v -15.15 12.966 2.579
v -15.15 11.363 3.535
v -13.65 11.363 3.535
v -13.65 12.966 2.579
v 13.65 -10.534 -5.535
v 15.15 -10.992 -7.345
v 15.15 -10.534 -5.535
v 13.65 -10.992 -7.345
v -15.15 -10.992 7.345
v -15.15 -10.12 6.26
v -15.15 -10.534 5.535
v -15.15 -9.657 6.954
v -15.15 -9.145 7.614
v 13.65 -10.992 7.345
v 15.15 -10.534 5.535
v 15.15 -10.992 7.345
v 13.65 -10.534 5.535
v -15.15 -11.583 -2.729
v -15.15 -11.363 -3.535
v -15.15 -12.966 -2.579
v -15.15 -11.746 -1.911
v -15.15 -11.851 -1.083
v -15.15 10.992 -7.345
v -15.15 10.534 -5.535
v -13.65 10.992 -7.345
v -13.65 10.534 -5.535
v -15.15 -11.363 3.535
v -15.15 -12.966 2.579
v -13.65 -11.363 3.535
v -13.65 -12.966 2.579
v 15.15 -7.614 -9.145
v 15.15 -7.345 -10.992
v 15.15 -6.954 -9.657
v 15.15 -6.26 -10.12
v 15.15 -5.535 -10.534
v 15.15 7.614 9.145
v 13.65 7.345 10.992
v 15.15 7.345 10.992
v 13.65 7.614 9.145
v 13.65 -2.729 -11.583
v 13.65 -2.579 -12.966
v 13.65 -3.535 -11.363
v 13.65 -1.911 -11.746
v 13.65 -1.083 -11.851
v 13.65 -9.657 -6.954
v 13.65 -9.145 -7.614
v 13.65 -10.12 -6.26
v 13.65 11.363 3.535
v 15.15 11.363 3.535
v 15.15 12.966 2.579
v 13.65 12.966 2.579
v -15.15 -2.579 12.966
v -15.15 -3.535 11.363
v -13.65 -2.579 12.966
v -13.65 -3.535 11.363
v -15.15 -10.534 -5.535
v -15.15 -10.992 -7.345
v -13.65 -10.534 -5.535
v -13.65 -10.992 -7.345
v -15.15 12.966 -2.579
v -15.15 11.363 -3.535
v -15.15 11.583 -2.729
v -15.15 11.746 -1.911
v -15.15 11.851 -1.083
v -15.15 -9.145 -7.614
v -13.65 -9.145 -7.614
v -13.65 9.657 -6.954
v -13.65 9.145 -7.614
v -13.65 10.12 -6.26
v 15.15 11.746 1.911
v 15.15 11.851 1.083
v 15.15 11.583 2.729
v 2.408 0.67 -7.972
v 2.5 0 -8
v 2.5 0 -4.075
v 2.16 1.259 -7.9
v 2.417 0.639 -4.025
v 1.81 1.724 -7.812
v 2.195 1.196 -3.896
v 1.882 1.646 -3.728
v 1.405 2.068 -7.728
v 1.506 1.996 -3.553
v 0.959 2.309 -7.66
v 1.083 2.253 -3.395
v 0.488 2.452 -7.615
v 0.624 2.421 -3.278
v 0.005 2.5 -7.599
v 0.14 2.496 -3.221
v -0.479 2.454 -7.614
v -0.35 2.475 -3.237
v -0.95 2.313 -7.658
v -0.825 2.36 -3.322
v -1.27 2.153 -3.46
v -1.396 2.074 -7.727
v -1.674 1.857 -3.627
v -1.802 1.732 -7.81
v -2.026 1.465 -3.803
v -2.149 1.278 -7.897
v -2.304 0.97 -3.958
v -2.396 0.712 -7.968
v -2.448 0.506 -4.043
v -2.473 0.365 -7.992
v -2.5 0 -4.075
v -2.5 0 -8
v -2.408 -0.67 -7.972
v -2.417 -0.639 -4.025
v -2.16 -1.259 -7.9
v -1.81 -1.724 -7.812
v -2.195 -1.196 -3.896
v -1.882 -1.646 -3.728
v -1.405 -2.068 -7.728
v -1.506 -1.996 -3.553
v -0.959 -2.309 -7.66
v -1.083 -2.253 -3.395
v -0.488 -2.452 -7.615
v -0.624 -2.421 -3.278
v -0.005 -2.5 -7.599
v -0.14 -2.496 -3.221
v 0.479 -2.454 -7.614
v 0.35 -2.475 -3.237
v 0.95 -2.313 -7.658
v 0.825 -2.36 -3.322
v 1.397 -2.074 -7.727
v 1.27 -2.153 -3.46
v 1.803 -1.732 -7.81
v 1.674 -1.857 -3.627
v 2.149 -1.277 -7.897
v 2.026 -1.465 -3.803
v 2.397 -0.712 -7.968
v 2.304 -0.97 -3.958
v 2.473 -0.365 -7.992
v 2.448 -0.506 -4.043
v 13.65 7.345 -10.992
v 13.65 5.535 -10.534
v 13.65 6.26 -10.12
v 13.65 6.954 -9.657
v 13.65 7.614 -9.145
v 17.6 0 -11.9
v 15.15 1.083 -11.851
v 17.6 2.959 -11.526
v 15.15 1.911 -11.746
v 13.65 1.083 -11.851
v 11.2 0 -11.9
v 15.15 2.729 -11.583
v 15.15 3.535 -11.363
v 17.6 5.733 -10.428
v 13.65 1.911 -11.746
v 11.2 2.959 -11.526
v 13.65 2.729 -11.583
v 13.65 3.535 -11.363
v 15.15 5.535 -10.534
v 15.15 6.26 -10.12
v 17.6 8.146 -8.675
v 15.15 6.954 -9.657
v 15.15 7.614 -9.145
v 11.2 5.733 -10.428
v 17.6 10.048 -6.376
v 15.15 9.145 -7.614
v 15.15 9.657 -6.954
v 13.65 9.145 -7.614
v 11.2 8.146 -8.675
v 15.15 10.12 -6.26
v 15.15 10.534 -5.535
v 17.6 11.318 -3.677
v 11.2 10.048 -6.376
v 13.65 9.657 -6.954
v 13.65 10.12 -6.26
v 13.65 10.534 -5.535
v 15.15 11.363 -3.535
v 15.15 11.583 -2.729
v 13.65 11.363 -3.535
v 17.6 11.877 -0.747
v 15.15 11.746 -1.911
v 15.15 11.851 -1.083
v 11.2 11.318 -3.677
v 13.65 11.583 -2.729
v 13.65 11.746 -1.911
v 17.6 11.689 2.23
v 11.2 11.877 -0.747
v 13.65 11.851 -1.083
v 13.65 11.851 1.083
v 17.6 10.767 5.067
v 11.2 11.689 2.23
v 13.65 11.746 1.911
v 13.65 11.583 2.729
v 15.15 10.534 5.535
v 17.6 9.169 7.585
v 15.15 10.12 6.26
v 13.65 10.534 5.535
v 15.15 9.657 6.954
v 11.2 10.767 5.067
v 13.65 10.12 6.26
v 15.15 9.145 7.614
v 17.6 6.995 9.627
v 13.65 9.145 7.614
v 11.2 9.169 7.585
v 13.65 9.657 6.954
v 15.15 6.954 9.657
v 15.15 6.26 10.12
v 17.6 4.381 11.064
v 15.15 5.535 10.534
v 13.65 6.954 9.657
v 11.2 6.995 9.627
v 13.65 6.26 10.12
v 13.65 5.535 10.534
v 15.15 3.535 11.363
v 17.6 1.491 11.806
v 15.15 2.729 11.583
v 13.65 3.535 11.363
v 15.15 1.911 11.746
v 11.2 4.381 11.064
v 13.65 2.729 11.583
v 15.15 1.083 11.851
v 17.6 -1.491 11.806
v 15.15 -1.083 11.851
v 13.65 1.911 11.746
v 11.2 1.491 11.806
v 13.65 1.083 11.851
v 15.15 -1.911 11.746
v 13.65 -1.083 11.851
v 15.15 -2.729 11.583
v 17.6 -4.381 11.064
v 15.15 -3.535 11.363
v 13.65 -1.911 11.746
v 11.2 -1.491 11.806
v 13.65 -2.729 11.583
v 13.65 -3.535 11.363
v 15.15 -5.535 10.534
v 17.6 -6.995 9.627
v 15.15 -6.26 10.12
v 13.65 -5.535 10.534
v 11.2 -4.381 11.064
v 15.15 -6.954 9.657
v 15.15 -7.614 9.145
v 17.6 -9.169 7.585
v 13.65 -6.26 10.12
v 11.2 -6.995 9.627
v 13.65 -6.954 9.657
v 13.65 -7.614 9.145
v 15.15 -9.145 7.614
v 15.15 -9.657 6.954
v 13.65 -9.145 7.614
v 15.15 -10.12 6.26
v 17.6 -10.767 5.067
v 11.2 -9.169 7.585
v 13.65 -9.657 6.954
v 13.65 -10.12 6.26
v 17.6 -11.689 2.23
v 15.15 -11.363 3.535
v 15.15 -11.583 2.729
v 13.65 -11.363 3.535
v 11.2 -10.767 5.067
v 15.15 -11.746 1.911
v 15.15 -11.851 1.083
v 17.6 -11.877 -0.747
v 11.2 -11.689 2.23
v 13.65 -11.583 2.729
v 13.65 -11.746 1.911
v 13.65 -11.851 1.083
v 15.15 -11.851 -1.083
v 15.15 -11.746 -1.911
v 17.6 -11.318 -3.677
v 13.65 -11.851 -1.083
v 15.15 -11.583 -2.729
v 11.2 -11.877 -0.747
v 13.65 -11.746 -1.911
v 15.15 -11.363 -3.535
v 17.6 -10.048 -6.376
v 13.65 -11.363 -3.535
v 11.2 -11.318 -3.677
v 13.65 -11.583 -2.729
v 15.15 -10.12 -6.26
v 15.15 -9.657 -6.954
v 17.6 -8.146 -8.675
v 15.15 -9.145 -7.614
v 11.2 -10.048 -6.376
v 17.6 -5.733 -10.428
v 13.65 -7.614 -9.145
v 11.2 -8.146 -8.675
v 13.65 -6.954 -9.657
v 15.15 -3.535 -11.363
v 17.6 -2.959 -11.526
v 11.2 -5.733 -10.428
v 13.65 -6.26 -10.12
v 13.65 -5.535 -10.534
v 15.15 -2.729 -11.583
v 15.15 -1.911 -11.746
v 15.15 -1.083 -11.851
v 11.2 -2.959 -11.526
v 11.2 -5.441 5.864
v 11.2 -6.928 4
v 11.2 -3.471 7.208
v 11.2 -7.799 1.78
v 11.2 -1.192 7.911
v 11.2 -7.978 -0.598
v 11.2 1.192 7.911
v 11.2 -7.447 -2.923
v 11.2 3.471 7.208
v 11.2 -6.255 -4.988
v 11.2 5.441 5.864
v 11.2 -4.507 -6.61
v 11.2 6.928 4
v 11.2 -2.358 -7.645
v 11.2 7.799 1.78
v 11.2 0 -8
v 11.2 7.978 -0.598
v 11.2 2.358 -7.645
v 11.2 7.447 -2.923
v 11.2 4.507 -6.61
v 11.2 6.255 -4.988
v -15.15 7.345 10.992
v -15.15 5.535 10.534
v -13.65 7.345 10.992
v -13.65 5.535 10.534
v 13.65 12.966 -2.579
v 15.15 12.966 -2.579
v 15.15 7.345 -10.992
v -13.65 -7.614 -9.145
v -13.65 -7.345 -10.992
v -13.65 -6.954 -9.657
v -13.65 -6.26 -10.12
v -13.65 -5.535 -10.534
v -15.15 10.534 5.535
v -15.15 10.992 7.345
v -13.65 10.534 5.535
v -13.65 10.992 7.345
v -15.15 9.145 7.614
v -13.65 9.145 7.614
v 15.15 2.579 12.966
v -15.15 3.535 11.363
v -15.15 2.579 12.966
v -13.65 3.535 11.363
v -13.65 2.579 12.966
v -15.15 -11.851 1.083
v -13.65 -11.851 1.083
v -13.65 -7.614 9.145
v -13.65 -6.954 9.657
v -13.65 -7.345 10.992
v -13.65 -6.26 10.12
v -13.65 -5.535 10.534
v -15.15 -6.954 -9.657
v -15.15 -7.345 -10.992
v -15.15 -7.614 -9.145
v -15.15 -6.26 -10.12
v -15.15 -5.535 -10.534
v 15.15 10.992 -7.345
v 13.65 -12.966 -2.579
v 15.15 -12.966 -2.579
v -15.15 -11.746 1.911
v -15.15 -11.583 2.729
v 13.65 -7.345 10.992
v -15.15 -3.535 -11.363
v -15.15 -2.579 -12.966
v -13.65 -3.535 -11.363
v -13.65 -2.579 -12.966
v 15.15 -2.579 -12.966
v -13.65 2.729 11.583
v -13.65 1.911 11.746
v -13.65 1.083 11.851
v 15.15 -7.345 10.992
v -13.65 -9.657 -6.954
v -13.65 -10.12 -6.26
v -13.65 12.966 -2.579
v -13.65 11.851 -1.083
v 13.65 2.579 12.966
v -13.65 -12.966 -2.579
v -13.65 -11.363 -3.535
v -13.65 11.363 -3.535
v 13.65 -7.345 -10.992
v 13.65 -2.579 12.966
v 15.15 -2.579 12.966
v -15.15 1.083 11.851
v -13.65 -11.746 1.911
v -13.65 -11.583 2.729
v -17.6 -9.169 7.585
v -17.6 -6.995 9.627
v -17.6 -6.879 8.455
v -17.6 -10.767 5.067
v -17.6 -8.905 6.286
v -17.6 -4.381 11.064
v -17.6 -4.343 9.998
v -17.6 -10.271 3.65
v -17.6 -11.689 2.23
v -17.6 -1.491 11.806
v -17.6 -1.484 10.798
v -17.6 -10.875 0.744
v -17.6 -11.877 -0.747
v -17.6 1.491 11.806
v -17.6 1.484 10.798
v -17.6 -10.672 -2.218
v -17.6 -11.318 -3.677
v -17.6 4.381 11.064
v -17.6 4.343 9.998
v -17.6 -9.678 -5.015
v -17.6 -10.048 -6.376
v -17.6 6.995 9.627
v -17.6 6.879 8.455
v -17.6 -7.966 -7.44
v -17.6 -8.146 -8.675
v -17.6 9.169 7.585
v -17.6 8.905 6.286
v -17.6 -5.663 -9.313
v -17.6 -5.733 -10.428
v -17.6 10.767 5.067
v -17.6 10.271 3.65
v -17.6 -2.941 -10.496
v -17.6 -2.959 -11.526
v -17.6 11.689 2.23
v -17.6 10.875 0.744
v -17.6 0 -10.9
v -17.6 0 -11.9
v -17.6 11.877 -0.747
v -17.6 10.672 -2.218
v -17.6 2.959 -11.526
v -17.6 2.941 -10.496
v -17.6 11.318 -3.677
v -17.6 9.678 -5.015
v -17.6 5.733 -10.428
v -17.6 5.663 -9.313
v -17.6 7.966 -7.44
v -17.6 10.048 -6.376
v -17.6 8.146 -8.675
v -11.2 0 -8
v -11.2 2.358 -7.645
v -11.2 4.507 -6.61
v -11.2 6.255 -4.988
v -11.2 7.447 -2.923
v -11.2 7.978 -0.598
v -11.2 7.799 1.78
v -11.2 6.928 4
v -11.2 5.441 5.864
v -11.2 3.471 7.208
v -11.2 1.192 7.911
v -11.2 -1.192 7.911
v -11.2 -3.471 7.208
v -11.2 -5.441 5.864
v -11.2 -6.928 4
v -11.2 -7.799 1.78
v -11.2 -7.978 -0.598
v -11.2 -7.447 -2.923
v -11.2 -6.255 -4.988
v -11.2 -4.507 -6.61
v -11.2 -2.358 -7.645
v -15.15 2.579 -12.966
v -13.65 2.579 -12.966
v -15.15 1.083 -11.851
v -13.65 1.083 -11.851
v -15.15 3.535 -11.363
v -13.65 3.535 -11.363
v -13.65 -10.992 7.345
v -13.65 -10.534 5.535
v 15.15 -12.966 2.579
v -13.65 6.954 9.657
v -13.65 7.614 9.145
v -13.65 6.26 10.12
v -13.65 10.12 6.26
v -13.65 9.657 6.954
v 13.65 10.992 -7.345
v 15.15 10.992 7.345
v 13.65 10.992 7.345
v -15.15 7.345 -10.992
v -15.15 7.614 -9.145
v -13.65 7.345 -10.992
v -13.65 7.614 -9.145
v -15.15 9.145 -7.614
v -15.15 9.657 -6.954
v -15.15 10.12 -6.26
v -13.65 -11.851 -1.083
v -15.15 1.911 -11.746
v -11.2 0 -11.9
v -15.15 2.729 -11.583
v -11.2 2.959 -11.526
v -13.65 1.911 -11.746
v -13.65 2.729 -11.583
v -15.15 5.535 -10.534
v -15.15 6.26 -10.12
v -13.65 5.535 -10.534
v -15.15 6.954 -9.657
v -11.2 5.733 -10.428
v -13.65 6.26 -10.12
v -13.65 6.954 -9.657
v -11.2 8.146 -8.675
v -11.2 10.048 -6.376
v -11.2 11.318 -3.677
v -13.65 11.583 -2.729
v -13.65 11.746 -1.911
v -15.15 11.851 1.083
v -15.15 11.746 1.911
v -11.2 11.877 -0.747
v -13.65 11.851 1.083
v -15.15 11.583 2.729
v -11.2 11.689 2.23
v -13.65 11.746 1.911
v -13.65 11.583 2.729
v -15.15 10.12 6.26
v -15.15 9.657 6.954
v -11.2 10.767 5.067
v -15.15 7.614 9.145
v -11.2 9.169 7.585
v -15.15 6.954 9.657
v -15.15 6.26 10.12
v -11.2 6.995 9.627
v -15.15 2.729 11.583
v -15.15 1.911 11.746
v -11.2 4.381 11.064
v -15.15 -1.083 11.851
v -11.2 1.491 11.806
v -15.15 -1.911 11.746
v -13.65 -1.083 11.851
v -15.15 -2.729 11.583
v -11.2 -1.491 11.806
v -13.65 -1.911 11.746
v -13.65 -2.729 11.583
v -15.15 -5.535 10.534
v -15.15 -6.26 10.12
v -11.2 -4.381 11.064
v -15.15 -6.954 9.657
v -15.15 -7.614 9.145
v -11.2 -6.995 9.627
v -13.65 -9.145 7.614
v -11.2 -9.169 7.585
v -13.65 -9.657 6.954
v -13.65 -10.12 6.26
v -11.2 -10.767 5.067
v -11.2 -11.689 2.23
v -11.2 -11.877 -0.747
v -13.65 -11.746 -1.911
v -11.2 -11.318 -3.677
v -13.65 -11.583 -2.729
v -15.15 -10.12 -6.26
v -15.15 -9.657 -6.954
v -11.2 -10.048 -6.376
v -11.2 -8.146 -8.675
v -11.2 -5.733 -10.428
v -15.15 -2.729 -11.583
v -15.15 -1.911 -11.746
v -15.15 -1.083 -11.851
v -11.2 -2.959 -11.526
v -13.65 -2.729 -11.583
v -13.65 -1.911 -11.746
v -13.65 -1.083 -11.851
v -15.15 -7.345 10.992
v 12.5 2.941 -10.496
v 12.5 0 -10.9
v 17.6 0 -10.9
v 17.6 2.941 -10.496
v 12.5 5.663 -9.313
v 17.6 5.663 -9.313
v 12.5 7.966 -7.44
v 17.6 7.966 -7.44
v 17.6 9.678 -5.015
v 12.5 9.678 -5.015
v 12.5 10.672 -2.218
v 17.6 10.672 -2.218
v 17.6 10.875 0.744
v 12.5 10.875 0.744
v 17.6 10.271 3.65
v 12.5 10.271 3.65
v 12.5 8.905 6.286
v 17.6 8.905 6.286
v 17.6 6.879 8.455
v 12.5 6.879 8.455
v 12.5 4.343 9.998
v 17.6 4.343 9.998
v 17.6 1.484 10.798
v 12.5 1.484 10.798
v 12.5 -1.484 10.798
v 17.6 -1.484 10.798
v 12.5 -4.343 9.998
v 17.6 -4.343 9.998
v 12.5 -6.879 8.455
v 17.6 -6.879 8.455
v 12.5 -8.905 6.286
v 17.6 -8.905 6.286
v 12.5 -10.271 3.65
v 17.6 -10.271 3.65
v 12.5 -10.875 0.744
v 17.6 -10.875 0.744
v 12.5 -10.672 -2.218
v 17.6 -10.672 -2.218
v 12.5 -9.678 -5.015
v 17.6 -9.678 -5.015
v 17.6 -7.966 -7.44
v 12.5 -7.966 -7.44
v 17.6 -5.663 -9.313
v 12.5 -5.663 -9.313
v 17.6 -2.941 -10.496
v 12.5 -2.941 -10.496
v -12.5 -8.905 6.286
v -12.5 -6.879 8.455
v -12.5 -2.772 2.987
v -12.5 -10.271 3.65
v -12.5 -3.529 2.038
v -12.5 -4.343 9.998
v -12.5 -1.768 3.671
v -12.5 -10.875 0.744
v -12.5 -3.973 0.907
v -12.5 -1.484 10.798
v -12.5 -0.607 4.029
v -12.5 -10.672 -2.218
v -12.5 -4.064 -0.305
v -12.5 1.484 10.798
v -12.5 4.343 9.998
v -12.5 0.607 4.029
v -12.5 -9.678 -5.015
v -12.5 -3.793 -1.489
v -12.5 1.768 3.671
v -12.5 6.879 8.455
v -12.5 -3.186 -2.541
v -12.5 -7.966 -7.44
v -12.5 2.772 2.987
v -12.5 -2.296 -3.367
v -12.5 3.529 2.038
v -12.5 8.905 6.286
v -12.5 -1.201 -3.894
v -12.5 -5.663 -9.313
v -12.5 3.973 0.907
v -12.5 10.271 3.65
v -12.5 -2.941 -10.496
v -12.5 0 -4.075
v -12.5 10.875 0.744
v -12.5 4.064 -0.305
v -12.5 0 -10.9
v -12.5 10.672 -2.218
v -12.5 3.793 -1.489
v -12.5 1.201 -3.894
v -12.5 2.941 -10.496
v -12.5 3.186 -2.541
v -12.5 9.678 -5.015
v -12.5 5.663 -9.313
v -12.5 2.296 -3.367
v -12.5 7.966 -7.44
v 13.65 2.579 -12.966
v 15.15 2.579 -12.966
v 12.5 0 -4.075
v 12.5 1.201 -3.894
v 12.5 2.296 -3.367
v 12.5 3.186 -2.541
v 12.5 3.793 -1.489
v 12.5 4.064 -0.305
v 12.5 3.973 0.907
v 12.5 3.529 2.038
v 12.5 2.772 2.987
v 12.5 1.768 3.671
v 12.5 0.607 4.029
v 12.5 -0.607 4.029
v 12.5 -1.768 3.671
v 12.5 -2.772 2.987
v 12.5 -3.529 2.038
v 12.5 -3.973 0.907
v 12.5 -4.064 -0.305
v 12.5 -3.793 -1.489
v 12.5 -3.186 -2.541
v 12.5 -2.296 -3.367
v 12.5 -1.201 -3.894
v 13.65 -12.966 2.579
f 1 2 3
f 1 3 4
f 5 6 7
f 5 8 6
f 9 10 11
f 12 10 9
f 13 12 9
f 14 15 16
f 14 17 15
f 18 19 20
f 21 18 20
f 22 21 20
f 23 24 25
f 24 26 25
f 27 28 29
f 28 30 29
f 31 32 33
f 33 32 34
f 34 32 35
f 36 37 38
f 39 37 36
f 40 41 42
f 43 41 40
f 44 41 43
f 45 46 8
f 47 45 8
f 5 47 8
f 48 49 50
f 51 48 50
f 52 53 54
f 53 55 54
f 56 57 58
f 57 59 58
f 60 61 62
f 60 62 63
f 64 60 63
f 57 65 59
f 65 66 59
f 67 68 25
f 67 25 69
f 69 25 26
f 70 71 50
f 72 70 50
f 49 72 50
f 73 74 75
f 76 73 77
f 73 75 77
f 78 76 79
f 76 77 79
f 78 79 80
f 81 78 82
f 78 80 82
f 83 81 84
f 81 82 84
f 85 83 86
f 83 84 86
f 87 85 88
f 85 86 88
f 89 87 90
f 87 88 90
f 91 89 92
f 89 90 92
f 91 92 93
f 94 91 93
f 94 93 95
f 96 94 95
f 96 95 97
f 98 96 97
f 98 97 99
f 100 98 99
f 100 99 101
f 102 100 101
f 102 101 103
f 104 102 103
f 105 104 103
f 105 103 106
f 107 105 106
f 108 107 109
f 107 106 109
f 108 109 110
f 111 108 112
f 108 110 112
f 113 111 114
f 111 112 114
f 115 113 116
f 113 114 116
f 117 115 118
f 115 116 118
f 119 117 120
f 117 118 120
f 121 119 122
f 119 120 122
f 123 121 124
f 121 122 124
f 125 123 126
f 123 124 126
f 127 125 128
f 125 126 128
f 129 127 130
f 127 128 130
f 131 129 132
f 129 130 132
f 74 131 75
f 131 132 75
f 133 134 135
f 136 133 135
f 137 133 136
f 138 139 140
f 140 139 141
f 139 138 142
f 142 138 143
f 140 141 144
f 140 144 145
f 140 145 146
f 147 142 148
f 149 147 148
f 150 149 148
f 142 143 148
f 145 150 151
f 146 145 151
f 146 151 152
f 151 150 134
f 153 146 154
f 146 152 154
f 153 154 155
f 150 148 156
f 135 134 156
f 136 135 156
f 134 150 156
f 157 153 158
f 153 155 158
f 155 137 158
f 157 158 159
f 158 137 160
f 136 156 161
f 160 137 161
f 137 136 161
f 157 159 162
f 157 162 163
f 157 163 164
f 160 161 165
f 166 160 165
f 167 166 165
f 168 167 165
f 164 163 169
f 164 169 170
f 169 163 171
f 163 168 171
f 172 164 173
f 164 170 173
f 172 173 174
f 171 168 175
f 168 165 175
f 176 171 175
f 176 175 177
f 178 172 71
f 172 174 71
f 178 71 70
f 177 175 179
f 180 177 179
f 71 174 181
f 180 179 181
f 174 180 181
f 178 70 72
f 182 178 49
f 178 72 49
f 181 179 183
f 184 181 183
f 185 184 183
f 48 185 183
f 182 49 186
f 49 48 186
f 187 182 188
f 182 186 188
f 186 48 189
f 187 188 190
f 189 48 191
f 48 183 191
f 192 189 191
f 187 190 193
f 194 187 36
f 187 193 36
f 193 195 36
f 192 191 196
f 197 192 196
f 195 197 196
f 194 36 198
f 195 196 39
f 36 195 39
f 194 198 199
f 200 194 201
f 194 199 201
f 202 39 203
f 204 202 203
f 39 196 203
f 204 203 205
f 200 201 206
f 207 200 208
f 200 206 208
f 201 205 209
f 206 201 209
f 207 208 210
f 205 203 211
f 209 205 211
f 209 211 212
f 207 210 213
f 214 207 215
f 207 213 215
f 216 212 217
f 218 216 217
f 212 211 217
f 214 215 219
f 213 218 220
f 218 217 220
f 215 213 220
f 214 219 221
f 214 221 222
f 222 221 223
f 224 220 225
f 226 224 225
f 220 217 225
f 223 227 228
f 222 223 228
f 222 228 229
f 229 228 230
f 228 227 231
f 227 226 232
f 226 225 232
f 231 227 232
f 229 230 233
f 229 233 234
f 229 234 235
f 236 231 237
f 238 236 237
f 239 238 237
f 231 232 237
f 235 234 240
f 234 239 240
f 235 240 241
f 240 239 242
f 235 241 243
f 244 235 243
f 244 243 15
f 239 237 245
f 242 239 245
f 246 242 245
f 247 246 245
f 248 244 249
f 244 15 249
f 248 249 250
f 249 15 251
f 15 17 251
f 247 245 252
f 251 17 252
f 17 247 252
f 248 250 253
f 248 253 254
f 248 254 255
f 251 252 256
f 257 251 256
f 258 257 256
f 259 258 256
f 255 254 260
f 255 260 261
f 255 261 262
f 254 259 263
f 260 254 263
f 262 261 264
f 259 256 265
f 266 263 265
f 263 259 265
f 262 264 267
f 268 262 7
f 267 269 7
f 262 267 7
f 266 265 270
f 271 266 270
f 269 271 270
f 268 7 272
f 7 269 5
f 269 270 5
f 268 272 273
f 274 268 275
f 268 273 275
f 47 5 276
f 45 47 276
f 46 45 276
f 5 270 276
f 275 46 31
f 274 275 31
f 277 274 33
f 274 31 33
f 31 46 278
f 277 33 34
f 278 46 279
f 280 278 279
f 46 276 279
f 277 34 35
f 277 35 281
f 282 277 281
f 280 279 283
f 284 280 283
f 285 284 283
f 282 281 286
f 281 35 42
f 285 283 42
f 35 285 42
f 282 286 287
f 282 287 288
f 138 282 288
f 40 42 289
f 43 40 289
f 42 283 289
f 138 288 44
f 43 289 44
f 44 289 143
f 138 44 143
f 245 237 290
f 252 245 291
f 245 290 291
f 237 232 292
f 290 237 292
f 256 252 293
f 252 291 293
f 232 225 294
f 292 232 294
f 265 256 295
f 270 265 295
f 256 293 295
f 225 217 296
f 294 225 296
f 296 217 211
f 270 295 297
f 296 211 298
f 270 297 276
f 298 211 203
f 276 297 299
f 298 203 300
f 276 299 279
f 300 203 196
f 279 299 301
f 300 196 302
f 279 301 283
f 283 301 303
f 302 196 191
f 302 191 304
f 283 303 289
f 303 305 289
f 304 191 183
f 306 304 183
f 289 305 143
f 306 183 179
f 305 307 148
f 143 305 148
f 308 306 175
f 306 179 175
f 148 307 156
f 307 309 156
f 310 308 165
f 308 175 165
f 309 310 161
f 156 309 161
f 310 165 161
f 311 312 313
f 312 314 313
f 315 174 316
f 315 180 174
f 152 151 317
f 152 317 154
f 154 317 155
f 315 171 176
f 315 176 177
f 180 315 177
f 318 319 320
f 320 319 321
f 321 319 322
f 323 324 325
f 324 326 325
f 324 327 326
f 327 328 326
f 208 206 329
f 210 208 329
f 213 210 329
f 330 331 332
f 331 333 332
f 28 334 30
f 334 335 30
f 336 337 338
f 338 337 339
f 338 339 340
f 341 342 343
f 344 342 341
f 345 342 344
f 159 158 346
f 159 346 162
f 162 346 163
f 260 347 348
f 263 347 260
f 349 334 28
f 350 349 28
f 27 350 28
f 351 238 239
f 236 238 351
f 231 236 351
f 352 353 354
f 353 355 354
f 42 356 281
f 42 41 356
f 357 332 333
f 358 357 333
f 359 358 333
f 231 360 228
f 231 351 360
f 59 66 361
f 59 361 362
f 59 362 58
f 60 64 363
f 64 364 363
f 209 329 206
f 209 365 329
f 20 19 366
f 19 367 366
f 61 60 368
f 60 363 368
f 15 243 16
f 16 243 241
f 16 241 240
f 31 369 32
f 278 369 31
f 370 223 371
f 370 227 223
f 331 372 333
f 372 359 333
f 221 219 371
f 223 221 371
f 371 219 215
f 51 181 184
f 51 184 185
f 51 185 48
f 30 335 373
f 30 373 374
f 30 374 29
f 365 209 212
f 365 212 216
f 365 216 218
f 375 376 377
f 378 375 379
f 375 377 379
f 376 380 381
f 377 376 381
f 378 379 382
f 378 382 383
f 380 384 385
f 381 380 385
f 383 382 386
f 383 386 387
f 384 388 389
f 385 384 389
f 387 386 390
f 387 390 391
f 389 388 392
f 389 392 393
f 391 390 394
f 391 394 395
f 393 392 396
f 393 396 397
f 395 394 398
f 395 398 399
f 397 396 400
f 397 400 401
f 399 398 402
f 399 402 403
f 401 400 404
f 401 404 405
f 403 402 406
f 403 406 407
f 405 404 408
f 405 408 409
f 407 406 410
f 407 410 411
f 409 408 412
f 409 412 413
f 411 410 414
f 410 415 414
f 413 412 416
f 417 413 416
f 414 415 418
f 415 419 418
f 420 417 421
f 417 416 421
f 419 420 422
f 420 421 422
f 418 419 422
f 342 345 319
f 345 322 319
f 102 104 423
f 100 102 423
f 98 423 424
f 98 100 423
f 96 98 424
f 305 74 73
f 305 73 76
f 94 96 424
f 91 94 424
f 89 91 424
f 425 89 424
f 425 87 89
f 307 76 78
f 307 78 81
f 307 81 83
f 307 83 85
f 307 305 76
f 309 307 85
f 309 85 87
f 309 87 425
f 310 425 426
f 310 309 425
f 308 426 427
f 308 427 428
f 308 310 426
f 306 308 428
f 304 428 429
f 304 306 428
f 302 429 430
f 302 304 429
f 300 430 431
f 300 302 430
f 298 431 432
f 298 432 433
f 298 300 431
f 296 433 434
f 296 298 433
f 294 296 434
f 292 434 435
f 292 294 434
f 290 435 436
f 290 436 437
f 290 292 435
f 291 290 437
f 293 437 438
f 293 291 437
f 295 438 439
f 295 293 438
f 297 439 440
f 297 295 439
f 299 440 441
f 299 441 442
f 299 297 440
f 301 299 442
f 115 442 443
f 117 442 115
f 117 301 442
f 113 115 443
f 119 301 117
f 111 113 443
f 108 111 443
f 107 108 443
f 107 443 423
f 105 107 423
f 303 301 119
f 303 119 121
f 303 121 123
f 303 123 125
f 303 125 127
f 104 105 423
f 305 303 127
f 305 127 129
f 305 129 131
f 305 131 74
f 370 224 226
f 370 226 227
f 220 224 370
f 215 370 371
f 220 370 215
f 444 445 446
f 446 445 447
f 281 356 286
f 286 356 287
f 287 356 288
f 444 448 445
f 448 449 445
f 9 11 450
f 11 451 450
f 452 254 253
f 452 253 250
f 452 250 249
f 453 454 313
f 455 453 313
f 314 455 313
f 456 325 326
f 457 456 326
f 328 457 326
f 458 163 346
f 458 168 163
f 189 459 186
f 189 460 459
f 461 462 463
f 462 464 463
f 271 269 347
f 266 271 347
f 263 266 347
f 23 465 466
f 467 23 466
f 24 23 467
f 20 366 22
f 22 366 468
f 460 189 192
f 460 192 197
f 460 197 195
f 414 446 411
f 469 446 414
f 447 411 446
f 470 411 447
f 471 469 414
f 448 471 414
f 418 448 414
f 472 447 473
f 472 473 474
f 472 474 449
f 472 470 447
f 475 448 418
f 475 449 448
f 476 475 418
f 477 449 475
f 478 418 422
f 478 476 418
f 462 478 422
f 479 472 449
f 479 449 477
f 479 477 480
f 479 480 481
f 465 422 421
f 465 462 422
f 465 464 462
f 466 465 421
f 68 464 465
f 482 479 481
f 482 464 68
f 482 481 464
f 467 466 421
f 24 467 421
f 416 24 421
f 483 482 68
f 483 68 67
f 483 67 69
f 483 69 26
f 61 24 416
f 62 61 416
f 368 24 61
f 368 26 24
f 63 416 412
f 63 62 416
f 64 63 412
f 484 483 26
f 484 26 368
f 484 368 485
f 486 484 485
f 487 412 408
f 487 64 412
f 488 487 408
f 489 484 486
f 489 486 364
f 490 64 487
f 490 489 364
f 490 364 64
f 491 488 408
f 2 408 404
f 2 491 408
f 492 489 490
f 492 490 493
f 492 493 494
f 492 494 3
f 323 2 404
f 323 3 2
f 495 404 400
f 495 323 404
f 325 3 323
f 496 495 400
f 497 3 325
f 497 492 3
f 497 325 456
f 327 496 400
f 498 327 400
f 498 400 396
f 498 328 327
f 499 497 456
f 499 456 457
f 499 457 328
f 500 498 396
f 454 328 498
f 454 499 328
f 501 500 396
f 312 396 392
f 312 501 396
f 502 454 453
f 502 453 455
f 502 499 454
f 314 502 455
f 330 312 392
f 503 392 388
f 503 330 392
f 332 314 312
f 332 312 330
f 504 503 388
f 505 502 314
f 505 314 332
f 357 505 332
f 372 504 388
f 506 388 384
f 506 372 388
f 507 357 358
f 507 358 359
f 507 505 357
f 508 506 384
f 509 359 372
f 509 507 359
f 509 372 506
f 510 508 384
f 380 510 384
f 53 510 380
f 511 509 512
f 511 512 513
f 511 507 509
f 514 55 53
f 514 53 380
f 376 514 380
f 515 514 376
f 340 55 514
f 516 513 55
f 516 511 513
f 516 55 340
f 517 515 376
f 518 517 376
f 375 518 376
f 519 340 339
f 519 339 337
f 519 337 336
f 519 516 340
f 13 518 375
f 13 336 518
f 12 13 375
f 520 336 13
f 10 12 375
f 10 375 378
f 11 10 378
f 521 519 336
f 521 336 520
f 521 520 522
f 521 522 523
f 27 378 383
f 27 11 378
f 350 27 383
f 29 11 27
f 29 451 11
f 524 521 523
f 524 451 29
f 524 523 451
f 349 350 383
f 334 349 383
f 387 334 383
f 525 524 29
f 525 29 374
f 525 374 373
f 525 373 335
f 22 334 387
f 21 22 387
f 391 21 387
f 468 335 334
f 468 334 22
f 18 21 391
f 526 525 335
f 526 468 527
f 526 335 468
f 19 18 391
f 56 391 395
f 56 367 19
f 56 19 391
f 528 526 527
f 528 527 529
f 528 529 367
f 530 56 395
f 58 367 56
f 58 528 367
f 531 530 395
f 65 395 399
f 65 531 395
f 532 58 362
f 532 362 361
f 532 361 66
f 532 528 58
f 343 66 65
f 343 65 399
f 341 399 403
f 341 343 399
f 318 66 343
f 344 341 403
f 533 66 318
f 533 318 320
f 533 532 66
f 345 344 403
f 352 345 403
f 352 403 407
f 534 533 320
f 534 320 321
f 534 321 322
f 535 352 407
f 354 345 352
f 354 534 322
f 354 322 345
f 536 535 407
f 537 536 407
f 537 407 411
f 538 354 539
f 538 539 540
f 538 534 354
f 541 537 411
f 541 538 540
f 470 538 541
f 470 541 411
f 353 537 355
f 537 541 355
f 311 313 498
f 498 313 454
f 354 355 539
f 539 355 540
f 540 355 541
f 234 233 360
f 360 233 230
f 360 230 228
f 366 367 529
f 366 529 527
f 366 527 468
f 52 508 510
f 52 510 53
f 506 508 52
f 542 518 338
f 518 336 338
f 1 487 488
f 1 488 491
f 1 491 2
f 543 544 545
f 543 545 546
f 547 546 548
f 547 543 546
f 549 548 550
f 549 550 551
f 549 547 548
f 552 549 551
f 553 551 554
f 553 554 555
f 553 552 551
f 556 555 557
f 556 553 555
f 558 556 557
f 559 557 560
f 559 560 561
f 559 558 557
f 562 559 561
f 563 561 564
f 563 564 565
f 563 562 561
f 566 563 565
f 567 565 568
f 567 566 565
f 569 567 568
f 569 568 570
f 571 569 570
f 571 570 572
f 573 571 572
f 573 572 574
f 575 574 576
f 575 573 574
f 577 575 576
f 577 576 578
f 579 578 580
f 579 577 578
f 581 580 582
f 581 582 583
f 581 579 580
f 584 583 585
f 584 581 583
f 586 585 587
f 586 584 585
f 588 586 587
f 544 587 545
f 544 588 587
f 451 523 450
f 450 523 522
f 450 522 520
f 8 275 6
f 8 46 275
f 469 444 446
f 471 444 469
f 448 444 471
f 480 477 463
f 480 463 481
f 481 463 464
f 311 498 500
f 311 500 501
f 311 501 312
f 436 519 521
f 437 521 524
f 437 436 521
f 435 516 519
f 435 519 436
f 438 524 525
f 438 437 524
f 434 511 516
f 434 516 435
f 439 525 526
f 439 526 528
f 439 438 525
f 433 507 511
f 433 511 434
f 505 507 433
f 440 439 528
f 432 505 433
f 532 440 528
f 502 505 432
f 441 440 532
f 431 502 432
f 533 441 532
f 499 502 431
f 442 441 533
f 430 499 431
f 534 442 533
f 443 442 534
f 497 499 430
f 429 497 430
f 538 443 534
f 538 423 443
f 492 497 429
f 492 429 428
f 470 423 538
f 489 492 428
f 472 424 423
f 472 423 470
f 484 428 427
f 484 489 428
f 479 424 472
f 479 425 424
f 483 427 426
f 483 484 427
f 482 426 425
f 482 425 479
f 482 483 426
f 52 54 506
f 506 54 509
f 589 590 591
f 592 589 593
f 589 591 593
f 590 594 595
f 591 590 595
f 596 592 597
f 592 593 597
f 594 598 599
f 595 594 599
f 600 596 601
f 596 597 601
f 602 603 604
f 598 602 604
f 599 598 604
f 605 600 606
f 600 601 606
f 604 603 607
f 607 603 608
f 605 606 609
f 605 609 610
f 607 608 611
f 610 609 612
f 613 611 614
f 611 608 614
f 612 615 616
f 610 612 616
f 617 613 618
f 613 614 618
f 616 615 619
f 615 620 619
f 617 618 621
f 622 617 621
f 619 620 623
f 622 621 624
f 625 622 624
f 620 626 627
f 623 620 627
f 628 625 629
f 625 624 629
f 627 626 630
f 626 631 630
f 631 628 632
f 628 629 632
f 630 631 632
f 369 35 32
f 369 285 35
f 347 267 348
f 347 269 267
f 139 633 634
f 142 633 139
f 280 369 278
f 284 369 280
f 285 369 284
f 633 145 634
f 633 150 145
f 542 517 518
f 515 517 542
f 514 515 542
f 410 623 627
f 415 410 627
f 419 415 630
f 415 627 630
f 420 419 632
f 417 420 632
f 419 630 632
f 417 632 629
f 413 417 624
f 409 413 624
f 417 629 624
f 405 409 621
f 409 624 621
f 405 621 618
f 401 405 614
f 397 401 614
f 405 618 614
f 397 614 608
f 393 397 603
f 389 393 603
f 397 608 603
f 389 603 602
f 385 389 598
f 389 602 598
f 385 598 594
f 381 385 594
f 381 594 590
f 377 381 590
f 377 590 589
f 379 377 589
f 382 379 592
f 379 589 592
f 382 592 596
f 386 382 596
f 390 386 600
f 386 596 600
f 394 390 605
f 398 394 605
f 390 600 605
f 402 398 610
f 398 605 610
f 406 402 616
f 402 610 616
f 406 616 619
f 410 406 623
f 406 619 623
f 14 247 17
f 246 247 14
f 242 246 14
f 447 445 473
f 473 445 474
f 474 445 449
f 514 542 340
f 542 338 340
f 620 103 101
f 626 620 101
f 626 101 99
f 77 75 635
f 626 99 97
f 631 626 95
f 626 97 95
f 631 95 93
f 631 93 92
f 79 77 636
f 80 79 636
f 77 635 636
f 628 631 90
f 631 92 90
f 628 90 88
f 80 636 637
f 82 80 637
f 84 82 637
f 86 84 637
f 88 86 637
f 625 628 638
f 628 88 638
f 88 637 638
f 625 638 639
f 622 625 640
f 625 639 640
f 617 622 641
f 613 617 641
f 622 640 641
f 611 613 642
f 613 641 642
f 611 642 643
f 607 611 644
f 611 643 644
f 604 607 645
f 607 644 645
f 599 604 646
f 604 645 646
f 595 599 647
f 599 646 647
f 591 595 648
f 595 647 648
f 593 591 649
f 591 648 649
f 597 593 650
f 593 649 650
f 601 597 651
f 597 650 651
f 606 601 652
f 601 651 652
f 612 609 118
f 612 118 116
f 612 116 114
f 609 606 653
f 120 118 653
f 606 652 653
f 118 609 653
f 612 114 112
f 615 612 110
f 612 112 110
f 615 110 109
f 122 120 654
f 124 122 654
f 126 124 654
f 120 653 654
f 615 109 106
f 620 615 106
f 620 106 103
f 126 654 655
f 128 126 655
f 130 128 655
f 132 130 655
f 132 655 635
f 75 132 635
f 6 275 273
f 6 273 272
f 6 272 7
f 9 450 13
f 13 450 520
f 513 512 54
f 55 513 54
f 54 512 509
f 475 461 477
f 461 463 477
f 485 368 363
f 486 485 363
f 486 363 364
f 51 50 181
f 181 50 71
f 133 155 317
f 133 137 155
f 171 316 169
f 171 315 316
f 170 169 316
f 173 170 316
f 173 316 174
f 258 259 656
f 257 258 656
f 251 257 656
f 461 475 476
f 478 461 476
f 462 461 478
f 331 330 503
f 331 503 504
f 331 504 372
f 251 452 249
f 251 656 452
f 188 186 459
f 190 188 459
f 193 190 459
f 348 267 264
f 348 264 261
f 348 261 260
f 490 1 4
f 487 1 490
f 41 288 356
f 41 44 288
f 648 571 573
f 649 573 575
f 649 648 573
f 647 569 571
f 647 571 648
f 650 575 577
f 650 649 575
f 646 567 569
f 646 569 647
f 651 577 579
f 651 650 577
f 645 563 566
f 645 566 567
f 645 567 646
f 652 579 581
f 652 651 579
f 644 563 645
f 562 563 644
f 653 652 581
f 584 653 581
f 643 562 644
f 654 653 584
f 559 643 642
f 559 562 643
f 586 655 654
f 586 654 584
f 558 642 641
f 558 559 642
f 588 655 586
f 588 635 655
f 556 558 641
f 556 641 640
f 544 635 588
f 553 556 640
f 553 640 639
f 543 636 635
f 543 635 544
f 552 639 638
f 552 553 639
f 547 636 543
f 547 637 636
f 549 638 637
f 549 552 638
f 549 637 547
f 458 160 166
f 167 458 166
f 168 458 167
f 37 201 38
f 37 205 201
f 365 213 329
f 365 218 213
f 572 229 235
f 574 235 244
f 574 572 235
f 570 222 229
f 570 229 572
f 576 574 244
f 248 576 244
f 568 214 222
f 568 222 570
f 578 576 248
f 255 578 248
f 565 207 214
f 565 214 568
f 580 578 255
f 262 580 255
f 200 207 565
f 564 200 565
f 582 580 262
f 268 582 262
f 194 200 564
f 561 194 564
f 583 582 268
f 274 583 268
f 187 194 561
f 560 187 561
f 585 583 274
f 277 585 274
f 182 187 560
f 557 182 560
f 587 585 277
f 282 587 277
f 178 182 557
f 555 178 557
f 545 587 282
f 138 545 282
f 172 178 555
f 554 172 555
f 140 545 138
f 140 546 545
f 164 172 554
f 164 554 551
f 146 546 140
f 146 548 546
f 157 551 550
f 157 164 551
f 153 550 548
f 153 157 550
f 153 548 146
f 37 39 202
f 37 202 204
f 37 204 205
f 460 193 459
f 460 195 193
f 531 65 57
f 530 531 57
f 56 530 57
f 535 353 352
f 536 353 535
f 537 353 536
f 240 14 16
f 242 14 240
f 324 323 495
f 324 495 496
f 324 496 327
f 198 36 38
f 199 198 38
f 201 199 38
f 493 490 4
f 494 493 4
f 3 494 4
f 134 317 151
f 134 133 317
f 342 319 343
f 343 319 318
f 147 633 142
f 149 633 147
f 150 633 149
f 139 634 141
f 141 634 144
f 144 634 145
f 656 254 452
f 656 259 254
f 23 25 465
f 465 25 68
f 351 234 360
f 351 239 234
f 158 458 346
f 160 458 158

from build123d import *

# Parameters (mm, degrees)
CROQUIS1_R              = 8
CROQUIS1_R_2            = 4.075
SALIENTE_EXTRUIR1_DEPTH = 11.2
CROQUIS3_R              = 11.9
CROQUIS3_R_2            = 4.075
SALIENTE_EXTRUIR2_DEPTH = 1.3
CROQUIS4_R              = 11.9
CROQUIS4_R_2            = 10.9
SALIENTE_EXTRUIR3_DEPTH = 5.1
SALIENTE_EXTRUIR4_DEPTH = 0.75
CROQUIS6_R              = 2.5
CORTAR_EXTRUIR1_DEPTH   = 13.966428038


with BuildPart() as part:
    # Croquis1 → Saliente-Extruir1 (new body, symmetric)
    with BuildSketch(Plane(origin=(0, 0, 0), x_dir=(0, 0, -1), z_dir=(1, 0, 0))):
        Circle(CROQUIS1_R)
        Circle(CROQUIS1_R_2, mode=Mode.SUBTRACT)
    extrude(amount=SALIENTE_EXTRUIR1_DEPTH, both=True)

    # Croquis3 → Saliente-Extruir2 (add)
    with BuildSketch(Plane(origin=(11.2, 0, 0), x_dir=(0, 0, -1), z_dir=(1, 0, 0))):
        Circle(CROQUIS3_R)
        Circle(CROQUIS3_R_2, mode=Mode.SUBTRACT)
    saliente_extruir2 = extrude(amount=SALIENTE_EXTRUIR2_DEPTH)

    # Croquis4 → Saliente-Extruir3 (add)
    with BuildSketch(Plane(origin=(12.5, 0, 0), x_dir=(0, 0, -1), z_dir=(1, 0, 0))):
        Circle(CROQUIS4_R)
        Circle(CROQUIS4_R_2, mode=Mode.SUBTRACT)
    saliente_extruir3 = extrude(amount=SALIENTE_EXTRUIR3_DEPTH)

    # Simetría1: Saliente-Extruir2, Saliente-Extruir3 across plane
    add(saliente_extruir2.mirror(Plane(origin=(0, 0, 0), x_dir=(0, 0, 1), z_dir=(1, 0, 0))))
    add(saliente_extruir3.mirror(Plane(origin=(0, 0, 0), x_dir=(0, 0, 1), z_dir=(1, 0, 0))))

    # Croquis5 → Saliente-Extruir4 (add, symmetric)
    with BuildSketch(Plane(origin=(14.4, 0, 0), x_dir=(0, 0, -1), z_dir=(1, 0, 0))):
        with BuildLine():
            Line((2.579182897, 12.966428038), (3.534712981, 11.362913541))
            ThreePointArc((3.534712981, 11.362913541), (2.321574832, 11.671344837), (1.08274978, 11.850639346))
            Line((1.08274978, 11.850639346), (2.579182897, 12.966428038))
        make_face()
        with BuildLine():
            Line((7.344891477, 10.99240691), (7.614047732, 9.145287155))
            ThreePointArc((7.614047732, 9.145287155), (6.611285773, 9.894488386), (5.535373701, 10.534212737))
            Line((5.535373701, 10.534212737), (7.344891477, 10.99240691))
        make_face()
        with BuildLine():
            Line((10.99240691, 7.344891477), (10.534212737, 5.535373701))
            ThreePointArc((10.534212737, 5.535373701), (9.894488386, 6.611285773), (9.145287155, 7.614047732))
            Line((9.145287155, 7.614047732), (10.99240691, 7.344891477))
        make_face()
        with BuildLine():
            Line((12.966428038, 2.579182897), (11.850639346, 1.08274978))
            ThreePointArc((11.850639346, 1.08274978), (11.671344837, 2.321574832), (11.362913541, 3.534712981))
            Line((11.362913541, 3.534712981), (12.966428038, 2.579182897))
        make_face()
        with BuildLine():
            Line((12.966428038, -2.579182897), (11.362913541, -3.534712981))
            ThreePointArc((11.362913541, -3.534712981), (11.671344837, -2.321574832), (11.850639346, -1.08274978))
            Line((11.850639346, -1.08274978), (12.966428038, -2.579182897))
        make_face()
        with BuildLine():
            Line((10.99240691, -7.344891477), (9.145287155, -7.614047732))
            ThreePointArc((9.145287155, -7.614047732), (9.894488386, -6.611285773), (10.534212737, -5.535373701))
            Line((10.534212737, -5.535373701), (10.99240691, -7.344891477))
        make_face()
        with BuildLine():
            Line((7.344891477, -10.99240691), (5.535373701, -10.534212737))
            ThreePointArc((5.535373701, -10.534212737), (6.611285773, -9.894488386), (7.614047732, -9.145287155))
            Line((7.614047732, -9.145287155), (7.344891477, -10.99240691))
        make_face()
        with BuildLine():
            Line((2.579182897, -12.966428038), (1.08274978, -11.850639346))
            ThreePointArc((1.08274978, -11.850639346), (2.321574832, -11.671344837), (3.534712981, -11.362913541))
            Line((3.534712981, -11.362913541), (2.579182897, -12.966428038))
        make_face()
        with BuildLine():
            Line((-2.579182897, -12.966428038), (-3.534712981, -11.362913541))
            ThreePointArc((-3.534712981, -11.362913541), (-2.321574832, -11.671344837), (-1.08274978, -11.850639346))
            Line((-1.08274978, -11.850639346), (-2.579182897, -12.966428038))
        make_face()
        with BuildLine():
            Line((-7.344891477, -10.99240691), (-7.614047732, -9.145287155))
            ThreePointArc((-7.614047732, -9.145287155), (-6.611285773, -9.894488386), (-5.535373701, -10.534212737))
            Line((-5.535373701, -10.534212737), (-7.344891477, -10.99240691))
        make_face()
        with BuildLine():
            Line((-10.99240691, -7.344891477), (-10.534212737, -5.535373701))
            ThreePointArc((-10.534212737, -5.535373701), (-9.894488386, -6.611285773), (-9.145287155, -7.614047732))
            Line((-9.145287155, -7.614047732), (-10.99240691, -7.344891477))
        make_face()
        with BuildLine():
            Line((-12.966428038, -2.579182897), (-11.850639346, -1.08274978))
            ThreePointArc((-11.850639346, -1.08274978), (-11.671344837, -2.321574832), (-11.362913541, -3.534712981))
            Line((-11.362913541, -3.534712981), (-12.966428038, -2.579182897))
        make_face()
        with BuildLine():
            Line((-12.966428038, 2.579182897), (-11.362913541, 3.534712981))
            ThreePointArc((-11.362913541, 3.534712981), (-11.671344837, 2.321574832), (-11.850639346, 1.08274978))
            Line((-11.850639346, 1.08274978), (-12.966428038, 2.579182897))
        make_face()
        with BuildLine():
            Line((-10.99240691, 7.344891477), (-9.145287155, 7.614047732))
            ThreePointArc((-9.145287155, 7.614047732), (-9.894488386, 6.611285773), (-10.534212737, 5.535373701))
            Line((-10.534212737, 5.535373701), (-10.99240691, 7.344891477))
        make_face()
        with BuildLine():
            Line((-7.344891477, 10.99240691), (-5.535373701, 10.534212737))
            ThreePointArc((-5.535373701, 10.534212737), (-6.611285773, 9.894488386), (-7.614047732, 9.145287155))
            Line((-7.614047732, 9.145287155), (-7.344891477, 10.99240691))
        make_face()
        with BuildLine():
            Line((-2.579182897, 12.966428038), (-1.08274978, 11.850639346))
            ThreePointArc((-1.08274978, 11.850639346), (-2.321574832, 11.671344837), (-3.534712981, 11.362913541))
            Line((-3.534712981, 11.362913541), (-2.579182897, 12.966428038))
        make_face()
    saliente_extruir4 = extrude(amount=SALIENTE_EXTRUIR4_DEPTH, both=True)

    # Simetría2: Saliente-Extruir4 across plane
    add(saliente_extruir4.mirror(Plane(origin=(0, 0, 0), x_dir=(0, 0, 1), z_dir=(1, 0, 0))))

    # Croquis6 → Cortar-Extruir1 (cut, through all)
    with BuildSketch(Plane.XY):
        Circle(CROQUIS6_R)
    extrude(amount=-CORTAR_EXTRUIR1_DEPTH, mode=Mode.SUBTRACT)


solid = part.part
